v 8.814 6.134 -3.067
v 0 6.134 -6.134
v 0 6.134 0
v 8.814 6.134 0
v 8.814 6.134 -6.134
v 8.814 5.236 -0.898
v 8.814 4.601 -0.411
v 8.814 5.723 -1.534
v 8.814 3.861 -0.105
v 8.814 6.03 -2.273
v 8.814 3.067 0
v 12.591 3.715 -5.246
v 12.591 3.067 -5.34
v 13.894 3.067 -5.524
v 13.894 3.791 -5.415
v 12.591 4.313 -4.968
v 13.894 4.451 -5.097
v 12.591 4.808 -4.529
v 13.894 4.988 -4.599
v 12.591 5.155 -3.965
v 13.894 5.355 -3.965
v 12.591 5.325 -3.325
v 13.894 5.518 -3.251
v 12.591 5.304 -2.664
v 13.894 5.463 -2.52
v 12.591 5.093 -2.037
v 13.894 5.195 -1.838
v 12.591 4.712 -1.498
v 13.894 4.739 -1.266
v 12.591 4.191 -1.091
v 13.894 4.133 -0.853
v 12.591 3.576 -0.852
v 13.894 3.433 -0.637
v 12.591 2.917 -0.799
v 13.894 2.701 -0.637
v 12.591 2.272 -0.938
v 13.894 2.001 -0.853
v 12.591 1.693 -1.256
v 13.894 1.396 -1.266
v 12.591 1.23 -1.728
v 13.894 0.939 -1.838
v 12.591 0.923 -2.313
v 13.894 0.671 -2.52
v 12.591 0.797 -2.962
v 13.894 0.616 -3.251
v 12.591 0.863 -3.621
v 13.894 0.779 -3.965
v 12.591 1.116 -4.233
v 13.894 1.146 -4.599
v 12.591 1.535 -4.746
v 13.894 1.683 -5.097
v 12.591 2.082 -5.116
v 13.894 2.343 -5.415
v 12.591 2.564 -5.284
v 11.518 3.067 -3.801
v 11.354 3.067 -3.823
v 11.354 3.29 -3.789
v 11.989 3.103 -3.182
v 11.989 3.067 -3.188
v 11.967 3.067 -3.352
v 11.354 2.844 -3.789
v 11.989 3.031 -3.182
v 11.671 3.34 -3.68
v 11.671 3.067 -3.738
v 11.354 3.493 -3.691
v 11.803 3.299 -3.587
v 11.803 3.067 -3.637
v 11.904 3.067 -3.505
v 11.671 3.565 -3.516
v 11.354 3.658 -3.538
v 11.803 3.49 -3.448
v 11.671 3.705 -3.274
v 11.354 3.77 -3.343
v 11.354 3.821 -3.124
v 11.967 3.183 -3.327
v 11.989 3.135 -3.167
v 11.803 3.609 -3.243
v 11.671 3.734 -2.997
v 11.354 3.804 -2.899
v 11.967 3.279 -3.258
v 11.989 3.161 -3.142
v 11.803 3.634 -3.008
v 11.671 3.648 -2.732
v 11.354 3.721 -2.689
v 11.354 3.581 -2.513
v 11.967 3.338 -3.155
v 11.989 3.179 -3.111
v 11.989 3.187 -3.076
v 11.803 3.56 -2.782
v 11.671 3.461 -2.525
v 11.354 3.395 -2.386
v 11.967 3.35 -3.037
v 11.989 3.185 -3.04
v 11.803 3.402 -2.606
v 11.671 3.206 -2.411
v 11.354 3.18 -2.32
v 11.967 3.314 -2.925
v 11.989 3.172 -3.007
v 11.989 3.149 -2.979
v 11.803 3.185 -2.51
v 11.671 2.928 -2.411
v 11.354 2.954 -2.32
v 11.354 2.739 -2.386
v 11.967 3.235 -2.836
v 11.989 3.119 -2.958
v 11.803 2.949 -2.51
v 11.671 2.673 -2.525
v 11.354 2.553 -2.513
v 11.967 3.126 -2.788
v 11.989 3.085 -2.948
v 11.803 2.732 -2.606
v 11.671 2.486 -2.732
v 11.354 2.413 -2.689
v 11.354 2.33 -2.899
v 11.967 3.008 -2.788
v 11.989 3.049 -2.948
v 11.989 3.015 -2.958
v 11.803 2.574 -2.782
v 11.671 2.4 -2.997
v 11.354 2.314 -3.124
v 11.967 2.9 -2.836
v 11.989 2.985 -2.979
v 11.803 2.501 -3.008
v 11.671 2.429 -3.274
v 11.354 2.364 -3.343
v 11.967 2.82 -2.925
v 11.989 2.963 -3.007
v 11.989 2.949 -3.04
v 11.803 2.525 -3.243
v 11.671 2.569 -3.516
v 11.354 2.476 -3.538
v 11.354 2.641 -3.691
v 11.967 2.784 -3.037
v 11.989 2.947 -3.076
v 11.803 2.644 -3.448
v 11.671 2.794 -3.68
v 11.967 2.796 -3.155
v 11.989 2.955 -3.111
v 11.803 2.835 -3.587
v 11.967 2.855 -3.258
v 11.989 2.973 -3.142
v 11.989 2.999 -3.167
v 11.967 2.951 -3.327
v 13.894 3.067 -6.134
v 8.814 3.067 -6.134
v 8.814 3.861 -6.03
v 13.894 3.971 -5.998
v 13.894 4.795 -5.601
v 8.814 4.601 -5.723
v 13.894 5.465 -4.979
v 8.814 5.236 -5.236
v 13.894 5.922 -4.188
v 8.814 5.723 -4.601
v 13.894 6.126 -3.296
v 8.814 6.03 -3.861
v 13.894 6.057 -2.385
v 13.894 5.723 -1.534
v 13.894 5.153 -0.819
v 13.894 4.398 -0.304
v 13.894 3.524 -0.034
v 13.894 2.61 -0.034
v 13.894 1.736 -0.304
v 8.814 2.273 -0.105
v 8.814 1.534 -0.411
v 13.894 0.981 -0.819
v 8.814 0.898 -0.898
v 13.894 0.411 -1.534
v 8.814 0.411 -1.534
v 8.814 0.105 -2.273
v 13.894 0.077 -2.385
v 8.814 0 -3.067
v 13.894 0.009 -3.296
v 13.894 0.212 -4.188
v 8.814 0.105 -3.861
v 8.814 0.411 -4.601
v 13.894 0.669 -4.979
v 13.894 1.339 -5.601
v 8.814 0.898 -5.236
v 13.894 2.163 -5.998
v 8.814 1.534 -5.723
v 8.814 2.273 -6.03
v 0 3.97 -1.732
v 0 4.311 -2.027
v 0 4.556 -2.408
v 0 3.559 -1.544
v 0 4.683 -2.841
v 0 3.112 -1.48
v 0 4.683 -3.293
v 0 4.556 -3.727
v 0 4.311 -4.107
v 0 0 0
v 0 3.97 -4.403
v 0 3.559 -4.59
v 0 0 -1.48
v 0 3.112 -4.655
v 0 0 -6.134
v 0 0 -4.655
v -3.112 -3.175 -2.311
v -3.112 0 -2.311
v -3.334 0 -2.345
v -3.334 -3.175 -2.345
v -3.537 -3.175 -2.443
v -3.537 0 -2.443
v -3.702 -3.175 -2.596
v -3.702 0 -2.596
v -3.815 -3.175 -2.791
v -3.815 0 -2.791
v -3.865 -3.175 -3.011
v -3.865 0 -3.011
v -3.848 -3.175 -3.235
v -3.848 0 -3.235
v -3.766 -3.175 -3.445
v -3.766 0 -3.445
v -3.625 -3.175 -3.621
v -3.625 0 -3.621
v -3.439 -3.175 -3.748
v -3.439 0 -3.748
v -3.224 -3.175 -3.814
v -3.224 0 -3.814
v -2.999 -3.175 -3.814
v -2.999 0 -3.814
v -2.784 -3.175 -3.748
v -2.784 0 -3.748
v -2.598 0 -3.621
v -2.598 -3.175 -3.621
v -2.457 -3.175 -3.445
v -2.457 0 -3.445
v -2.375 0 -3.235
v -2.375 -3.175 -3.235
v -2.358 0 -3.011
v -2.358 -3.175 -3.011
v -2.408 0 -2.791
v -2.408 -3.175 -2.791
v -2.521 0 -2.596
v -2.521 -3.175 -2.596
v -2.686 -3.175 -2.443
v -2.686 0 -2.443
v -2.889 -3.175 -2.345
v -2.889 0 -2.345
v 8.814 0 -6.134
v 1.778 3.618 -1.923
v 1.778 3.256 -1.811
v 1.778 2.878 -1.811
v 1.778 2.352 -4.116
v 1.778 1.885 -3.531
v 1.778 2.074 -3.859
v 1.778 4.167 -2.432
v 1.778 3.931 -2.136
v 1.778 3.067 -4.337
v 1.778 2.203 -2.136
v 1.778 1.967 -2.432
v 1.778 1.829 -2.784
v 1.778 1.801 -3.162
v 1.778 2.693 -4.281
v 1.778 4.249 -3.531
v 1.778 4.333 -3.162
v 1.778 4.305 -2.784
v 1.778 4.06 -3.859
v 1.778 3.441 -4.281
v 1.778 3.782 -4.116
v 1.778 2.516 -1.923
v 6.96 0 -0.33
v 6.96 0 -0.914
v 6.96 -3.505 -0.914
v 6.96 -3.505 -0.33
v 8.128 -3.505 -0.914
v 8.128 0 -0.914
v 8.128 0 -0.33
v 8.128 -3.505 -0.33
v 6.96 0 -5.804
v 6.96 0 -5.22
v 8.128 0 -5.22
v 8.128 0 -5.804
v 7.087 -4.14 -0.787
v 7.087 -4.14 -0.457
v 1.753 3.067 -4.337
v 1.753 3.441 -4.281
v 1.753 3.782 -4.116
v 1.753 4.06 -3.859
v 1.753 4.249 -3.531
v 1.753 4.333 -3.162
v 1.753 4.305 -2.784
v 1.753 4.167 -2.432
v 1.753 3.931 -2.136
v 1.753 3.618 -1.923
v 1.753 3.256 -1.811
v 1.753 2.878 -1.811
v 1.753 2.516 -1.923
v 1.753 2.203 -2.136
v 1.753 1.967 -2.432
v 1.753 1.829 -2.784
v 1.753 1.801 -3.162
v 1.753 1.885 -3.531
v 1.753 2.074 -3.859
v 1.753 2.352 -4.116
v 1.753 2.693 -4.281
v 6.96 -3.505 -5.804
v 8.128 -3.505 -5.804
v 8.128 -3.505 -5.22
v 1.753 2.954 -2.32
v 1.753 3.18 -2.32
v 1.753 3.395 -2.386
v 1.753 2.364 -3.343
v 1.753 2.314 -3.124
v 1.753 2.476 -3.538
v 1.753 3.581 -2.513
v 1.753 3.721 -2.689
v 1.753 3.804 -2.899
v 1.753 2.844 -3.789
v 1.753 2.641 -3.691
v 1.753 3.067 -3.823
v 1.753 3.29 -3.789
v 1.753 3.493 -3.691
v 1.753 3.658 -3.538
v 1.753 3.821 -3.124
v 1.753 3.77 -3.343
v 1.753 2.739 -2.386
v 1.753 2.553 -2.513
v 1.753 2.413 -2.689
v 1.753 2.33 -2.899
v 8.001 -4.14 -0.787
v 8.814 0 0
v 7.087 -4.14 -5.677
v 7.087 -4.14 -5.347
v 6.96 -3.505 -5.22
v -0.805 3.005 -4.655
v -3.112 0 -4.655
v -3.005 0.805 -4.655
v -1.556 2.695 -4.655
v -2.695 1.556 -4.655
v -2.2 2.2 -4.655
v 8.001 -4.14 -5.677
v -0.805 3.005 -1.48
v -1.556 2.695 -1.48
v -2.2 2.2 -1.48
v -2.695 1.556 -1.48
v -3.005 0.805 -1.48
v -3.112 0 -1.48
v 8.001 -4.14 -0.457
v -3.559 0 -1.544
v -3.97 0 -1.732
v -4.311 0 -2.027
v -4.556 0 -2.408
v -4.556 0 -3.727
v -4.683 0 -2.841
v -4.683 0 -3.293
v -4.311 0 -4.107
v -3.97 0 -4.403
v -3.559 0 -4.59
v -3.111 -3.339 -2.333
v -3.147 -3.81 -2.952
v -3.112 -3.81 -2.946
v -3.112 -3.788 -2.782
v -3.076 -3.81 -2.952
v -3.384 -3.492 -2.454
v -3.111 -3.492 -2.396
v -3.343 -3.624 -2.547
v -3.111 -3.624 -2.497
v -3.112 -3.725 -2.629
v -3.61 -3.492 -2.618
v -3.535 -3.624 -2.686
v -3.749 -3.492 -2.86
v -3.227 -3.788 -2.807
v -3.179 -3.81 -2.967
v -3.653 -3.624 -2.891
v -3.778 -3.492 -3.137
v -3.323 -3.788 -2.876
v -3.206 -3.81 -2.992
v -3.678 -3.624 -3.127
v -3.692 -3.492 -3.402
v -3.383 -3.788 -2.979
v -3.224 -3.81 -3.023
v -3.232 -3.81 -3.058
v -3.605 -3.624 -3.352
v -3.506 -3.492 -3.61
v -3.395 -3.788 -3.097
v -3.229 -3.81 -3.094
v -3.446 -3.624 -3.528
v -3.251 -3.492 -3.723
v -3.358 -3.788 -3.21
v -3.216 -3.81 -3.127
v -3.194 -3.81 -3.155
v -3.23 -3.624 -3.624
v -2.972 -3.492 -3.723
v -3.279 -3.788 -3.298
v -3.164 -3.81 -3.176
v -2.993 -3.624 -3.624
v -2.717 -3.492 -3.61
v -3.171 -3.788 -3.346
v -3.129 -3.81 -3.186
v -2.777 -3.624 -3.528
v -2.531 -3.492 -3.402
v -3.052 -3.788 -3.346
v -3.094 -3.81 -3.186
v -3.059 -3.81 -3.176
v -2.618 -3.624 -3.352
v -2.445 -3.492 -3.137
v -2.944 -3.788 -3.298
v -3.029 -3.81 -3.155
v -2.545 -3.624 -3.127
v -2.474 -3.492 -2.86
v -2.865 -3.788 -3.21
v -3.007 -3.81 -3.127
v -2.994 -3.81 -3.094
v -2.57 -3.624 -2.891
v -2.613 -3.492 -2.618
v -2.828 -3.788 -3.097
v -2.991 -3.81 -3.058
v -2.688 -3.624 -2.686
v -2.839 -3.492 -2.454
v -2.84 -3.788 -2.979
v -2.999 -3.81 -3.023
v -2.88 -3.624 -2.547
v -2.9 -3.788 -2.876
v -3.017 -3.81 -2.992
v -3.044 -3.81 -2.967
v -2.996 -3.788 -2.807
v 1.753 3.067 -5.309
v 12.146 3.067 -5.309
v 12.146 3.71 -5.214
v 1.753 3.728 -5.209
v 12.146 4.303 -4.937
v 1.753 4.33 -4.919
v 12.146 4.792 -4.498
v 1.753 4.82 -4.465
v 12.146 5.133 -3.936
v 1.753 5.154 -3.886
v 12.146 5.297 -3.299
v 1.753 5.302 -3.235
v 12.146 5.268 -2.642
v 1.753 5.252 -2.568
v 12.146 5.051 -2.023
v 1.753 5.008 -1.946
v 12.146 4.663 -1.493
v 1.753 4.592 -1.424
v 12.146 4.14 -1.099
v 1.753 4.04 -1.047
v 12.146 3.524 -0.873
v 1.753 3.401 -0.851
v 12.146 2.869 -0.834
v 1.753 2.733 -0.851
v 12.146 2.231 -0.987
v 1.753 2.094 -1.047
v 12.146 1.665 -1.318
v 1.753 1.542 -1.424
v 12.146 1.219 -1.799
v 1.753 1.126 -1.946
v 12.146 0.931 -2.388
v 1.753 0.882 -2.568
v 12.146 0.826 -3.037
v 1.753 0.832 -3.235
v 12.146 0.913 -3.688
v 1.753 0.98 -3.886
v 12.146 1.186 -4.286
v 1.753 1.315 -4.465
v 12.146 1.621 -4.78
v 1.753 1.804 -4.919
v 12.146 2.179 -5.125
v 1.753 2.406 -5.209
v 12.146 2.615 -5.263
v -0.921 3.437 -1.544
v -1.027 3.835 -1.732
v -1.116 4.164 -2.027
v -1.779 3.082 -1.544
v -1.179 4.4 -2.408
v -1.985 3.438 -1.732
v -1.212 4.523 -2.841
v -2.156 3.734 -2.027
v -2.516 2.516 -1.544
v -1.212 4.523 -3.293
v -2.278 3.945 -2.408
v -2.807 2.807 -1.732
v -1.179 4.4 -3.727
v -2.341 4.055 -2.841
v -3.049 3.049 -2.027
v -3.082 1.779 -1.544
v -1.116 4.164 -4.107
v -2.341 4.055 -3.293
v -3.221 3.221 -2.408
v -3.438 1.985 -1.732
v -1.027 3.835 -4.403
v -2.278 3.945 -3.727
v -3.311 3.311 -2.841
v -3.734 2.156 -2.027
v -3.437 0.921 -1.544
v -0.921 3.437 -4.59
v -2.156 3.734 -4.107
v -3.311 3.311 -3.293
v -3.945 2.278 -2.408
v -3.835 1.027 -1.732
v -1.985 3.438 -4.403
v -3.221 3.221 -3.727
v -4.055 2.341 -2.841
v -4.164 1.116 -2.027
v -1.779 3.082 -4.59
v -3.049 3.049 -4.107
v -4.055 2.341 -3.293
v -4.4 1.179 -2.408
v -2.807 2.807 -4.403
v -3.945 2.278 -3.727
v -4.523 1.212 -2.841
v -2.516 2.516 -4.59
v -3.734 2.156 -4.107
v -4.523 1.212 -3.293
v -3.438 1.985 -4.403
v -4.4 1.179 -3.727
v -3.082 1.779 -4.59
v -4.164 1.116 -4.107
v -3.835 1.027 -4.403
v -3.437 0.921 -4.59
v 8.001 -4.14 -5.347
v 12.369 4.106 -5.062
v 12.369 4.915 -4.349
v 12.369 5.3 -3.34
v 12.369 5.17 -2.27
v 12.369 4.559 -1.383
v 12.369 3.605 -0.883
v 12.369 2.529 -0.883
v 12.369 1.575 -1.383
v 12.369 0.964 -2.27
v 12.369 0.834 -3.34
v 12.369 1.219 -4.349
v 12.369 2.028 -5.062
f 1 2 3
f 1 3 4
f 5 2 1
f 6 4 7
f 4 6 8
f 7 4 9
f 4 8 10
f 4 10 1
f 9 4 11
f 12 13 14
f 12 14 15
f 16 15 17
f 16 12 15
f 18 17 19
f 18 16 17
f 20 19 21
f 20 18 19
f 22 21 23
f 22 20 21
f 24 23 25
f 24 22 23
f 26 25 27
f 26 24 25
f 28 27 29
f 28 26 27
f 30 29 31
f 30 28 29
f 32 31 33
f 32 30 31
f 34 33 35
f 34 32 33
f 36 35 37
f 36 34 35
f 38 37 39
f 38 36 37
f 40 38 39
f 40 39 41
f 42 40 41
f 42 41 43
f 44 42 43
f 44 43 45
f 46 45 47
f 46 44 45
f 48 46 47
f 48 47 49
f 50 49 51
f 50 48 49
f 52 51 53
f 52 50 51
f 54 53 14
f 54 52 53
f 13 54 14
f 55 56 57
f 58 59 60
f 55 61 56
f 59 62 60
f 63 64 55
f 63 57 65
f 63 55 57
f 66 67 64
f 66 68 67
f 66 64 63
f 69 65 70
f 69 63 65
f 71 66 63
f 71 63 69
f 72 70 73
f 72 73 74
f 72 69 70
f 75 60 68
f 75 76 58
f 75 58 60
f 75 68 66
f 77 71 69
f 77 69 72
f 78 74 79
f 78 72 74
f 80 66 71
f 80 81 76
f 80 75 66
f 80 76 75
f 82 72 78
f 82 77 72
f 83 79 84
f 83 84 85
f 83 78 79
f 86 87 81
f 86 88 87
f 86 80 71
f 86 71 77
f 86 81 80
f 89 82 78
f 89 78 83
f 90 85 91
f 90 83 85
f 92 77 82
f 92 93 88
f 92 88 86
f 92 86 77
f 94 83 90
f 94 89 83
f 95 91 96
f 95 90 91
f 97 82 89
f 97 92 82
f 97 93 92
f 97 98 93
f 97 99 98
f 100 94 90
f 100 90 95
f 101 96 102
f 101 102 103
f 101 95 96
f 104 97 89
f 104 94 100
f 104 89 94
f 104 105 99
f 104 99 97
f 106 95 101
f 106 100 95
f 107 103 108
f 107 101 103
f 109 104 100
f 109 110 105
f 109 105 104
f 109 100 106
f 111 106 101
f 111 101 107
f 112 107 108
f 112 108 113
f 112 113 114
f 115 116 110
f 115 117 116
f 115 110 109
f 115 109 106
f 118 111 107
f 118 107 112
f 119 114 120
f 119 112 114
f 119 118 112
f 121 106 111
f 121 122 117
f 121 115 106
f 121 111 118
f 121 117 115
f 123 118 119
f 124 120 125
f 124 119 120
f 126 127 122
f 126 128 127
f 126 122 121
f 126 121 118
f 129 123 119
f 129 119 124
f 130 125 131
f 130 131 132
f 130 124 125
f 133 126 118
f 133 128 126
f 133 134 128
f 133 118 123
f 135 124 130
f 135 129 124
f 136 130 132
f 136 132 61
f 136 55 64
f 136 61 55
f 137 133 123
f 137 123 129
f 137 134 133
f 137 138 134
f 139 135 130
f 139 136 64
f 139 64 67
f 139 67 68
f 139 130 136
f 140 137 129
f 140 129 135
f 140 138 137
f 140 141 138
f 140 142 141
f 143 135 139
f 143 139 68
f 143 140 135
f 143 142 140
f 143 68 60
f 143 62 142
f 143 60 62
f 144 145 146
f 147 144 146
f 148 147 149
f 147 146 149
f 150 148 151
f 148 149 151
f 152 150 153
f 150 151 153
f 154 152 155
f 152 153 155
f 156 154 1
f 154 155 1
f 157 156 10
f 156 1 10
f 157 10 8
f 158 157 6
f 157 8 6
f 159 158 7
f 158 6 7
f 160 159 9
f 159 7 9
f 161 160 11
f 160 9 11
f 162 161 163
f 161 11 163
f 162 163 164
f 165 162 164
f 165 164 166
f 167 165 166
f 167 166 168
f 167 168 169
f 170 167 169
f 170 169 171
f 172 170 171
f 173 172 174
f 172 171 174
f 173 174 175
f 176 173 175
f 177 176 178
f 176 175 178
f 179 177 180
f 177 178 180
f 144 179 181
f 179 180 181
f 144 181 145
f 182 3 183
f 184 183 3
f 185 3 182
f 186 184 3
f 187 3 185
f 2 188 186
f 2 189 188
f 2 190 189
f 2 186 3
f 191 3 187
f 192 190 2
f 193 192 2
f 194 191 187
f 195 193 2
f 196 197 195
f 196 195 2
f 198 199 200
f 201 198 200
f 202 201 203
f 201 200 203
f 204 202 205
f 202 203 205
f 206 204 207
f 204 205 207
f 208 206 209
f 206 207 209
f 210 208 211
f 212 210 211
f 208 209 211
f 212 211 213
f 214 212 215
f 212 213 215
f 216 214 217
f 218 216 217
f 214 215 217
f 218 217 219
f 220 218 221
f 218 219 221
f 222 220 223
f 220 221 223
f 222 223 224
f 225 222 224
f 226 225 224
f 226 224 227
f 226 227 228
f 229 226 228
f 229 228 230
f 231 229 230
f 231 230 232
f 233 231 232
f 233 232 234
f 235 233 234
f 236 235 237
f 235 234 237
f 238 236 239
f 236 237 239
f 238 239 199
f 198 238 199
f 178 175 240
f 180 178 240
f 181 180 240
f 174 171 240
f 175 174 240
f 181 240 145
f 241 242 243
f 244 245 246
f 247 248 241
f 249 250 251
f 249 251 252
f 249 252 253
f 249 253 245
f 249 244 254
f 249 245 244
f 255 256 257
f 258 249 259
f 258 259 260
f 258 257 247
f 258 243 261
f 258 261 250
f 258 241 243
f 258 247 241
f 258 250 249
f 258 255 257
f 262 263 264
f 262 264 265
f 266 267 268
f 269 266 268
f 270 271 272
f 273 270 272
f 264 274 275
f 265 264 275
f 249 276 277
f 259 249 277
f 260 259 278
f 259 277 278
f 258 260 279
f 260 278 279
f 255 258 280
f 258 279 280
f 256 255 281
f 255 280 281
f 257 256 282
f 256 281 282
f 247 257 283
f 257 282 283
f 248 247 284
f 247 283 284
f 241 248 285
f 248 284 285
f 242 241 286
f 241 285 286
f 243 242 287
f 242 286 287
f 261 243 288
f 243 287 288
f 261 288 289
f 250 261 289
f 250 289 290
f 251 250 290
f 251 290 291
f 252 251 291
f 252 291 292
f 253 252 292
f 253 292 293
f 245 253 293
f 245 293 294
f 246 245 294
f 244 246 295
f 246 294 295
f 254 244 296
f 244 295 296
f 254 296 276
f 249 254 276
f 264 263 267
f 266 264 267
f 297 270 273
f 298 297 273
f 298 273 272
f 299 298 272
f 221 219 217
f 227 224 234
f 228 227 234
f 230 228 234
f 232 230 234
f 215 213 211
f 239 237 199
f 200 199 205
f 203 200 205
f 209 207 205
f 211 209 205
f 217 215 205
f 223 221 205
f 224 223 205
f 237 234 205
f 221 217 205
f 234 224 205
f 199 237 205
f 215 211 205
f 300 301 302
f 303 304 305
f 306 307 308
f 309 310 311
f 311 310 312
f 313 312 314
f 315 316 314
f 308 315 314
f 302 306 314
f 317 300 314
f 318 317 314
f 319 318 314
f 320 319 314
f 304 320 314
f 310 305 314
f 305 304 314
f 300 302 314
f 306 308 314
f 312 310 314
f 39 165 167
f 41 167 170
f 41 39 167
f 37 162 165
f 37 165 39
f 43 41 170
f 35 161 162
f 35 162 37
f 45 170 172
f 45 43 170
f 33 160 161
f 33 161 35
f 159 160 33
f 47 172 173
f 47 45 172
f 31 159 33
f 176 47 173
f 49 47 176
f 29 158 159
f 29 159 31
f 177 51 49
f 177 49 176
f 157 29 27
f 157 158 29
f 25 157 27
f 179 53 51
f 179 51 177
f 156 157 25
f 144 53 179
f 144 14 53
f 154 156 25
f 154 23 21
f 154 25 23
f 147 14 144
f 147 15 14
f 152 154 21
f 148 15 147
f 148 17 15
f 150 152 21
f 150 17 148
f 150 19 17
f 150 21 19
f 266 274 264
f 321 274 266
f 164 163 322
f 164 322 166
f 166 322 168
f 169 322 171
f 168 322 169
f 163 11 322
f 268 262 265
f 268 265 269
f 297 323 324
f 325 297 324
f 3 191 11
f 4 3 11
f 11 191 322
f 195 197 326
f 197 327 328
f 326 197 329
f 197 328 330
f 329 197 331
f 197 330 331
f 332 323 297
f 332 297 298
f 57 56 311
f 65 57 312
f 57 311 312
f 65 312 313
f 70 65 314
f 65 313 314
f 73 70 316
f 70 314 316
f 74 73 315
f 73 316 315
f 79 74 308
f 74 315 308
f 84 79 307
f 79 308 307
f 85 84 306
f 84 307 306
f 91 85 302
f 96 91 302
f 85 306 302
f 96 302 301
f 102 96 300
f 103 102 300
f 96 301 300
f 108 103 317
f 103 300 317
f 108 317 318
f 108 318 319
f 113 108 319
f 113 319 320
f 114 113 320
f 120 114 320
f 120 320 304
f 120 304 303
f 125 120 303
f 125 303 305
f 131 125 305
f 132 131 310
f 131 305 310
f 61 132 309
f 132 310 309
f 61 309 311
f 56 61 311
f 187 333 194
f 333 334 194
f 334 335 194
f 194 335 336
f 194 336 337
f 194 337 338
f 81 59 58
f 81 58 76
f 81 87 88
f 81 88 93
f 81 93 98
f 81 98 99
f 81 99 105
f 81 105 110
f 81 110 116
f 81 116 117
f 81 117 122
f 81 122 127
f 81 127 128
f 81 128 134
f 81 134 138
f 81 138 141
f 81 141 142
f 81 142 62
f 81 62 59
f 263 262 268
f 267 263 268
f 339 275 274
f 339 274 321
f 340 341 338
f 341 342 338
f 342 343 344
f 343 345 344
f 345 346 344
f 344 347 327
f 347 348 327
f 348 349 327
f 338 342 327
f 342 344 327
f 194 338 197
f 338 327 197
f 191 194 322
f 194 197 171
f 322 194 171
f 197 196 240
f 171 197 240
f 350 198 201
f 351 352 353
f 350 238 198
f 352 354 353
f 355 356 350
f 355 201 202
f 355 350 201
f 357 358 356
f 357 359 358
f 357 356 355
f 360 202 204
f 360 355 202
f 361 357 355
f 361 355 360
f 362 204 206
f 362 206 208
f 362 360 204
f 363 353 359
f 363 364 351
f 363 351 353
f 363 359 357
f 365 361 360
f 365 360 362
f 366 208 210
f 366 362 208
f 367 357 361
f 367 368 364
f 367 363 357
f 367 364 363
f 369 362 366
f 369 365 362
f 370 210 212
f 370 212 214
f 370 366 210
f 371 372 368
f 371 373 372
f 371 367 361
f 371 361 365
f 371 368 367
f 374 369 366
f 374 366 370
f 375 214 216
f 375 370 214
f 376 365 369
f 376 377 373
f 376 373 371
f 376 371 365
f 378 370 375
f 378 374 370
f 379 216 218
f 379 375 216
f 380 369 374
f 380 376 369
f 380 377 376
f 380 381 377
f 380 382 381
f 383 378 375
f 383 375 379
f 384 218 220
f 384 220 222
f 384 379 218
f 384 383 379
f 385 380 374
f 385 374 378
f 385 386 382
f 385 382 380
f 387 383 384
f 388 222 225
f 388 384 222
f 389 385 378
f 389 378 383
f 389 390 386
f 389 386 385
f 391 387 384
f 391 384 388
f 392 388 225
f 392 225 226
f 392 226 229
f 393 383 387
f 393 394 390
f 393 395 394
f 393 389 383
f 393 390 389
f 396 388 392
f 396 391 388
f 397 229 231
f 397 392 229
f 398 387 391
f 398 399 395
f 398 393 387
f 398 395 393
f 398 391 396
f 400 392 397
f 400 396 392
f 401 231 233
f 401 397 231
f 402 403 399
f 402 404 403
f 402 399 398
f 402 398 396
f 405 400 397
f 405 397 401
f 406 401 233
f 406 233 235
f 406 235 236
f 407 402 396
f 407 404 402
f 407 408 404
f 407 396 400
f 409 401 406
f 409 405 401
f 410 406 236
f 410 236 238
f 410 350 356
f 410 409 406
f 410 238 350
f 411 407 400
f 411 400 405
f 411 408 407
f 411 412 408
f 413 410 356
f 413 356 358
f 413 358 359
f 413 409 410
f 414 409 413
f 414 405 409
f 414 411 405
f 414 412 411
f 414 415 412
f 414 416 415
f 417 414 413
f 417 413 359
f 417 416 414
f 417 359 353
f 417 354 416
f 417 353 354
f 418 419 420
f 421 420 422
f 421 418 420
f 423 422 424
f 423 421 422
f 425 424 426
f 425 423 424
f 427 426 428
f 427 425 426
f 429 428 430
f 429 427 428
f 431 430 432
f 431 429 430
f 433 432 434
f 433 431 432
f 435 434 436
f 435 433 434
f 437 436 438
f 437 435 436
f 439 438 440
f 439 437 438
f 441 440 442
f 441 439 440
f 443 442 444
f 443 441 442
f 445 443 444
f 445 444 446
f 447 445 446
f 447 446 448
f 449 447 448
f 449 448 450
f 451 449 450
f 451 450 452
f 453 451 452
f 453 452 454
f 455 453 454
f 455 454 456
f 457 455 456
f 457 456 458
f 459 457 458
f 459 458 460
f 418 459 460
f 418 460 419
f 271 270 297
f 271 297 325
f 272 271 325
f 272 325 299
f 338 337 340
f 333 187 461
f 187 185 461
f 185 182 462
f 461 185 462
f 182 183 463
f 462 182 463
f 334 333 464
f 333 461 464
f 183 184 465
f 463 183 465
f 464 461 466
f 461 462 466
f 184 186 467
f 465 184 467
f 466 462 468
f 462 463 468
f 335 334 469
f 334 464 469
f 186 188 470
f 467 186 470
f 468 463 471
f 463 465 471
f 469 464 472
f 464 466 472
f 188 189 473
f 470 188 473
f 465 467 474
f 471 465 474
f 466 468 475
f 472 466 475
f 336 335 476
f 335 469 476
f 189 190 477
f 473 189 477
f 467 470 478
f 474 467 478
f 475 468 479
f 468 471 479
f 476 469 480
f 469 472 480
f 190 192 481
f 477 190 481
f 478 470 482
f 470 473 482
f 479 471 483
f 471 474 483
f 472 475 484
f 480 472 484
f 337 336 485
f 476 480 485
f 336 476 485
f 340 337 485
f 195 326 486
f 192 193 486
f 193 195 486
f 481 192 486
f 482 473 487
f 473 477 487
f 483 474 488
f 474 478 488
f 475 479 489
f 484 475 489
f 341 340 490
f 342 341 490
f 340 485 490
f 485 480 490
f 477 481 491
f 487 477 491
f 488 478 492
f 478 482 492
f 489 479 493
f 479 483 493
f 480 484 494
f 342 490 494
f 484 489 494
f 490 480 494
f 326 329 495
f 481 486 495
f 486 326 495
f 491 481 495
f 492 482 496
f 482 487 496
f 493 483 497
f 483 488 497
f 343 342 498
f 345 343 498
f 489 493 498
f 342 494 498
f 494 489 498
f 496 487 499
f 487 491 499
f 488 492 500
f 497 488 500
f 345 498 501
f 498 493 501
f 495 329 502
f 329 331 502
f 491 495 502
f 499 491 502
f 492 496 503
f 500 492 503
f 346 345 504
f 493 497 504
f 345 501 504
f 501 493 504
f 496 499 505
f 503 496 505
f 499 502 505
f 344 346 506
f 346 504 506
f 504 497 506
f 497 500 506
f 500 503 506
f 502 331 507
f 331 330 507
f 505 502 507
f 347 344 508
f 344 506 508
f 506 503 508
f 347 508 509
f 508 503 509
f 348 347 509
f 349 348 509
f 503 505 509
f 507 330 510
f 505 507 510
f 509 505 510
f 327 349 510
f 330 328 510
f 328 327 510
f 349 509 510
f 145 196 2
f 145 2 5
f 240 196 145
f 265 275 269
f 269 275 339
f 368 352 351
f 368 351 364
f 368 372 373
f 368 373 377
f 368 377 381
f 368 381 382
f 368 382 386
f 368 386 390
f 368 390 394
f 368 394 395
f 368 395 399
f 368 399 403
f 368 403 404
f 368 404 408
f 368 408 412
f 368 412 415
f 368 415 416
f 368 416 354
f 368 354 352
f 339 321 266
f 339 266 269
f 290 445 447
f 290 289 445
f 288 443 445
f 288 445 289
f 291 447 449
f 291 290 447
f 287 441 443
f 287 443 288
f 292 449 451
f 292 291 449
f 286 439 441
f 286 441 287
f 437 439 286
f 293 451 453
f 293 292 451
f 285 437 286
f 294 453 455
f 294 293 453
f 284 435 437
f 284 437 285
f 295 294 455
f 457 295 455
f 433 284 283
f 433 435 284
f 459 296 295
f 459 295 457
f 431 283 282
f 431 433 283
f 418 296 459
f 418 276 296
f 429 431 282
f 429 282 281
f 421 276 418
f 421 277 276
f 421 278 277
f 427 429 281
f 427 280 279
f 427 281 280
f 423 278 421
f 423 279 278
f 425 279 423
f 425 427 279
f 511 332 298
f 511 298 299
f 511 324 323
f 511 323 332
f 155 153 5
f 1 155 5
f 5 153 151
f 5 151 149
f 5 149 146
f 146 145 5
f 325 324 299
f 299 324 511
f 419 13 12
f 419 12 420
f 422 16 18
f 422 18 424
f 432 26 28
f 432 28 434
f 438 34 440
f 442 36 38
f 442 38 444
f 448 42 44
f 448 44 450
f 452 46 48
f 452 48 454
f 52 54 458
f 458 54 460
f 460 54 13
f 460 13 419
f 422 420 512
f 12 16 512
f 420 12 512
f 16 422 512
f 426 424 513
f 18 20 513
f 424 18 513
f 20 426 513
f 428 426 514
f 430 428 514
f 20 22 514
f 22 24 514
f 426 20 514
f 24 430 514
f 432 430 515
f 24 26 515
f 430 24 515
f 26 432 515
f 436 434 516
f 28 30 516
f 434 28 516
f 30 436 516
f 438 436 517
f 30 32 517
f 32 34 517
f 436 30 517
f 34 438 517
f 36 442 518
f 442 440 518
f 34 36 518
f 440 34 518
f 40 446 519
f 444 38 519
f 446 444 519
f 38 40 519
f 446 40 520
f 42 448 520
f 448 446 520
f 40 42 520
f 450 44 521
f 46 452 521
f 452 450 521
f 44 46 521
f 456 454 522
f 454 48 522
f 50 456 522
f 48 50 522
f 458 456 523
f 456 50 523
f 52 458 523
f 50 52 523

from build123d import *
from OCP.BRepFilletAPI import BRepFilletAPI_MakeChamfer

# Parameters (mm, degrees)
SKETCH1_W             = 8.8138
SKETCH1_H             = 6.1341
BOSS_EXTRUDE1_DEPTH   = 6.1341
SKETCH2_R             = 3.06705
SKETCH2_R_2           = 2.24155
BOSS_EXTRUDE2_DEPTH   = 5.08
REVOLVE1_ANGLE        = 90
CUT_EXTRUDE1_START    = -7.0612
SKETCH6_R             = 2.24155
CUT_EXTRUDE1_DEPTH    = 7.0612
SKETCH11_R            = 1.27
BOSS_EXTRUDE6_DEPTH   = 0.0254
CHAMFER3_SIZE         = 0.2159
CHAMFER3_SIZE2        = 1.524
FILLET4_R             = 3.175
SKETCH7_R             = 0.75565
BOSS_EXTRUDE3_DEPTH   = 10.2362
FILLET3_R             = 0.635
SKETCH8_R             = 0.75565
BOSS_EXTRUDE4_DEPTH   = 3.81
FILLET2_R             = 0.635
SKETCH10_W            = 1.1684
SKETCH10_H            = 0.5842
BOSS_EXTRUDE5_DEPTH   = 4.1402
BOSS_EXTRUDE5_2_DEPTH = 4.1402
CHAMFER1_SIZE         = 0.635
CHAMFER1_SIZE2        = 0.127
CHAMFER2_SIZE         = 0.635
CHAMFER2_SIZE2        = 0.127


with BuildPart() as part:
    # Sketch1 → Boss-Extrude1 (new body)
    with BuildSketch(Plane(origin=(0, 0, 0), x_dir=(1, 0, 0), z_dir=(0, 1, 0))):
        with Locations((4.4069, 3.06705)):
            Rectangle(SKETCH1_W, SKETCH1_H)
    extrude(amount=BOSS_EXTRUDE1_DEPTH)

    # Sketch2 → Boss-Extrude2 (add)
    with BuildSketch(Plane(origin=(8.8138, 0, 0), x_dir=(0, 0, -1), z_dir=(1, 0, 0))):
        with Locations((3.06705, 3.06705)):
            Circle(SKETCH2_R)
        with Locations((3.06705, 3.06705)):
            Circle(SKETCH2_R_2, mode=Mode.SUBTRACT)
    extrude(amount=BOSS_EXTRUDE2_DEPTH)

    # Sketch3 → Revolve1 (revolve)
    with BuildSketch(Plane.ZY):
        with BuildLine():
            Line((-4.65455, 3.1115), (-4.65455, 0))
            Line((-4.65455, 0), (-1.47955, 0))
            Line((-1.47955, 0), (-1.47955, 3.1115))
            ThreePointArc((-1.47955, 3.1115), (-3.06705, 4.699), (-4.65455, 3.1115))
        make_face()
    revolve(axis=Axis((0, 0, 0), (0, 0, 1)), revolution_arc=REVOLVE1_ANGLE)

    # Sketch6 → Cut-Extrude1 (cut)
    with BuildSketch(Plane(origin=(8.8138, 0, 0), x_dir=(0, 0, -1), z_dir=(1, 0, 0)).offset(CUT_EXTRUDE1_START)):
        with Locations((3.06705, 3.06705)):
            Circle(SKETCH6_R)
    extrude(amount=CUT_EXTRUDE1_DEPTH, mode=Mode.SUBTRACT)

    # Sketch11 → Boss-Extrude6 (add)
    with BuildSketch(Plane(origin=(1.7526, 0, 0), x_dir=(0, 0, -1), z_dir=(1, 0, 0))):
        with Locations((3.06705, 3.06705)):
            Circle(SKETCH11_R)
    extrude(amount=BOSS_EXTRUDE6_DEPTH)

    # Chamfer3
    chamfer3_edges = [part.edges().sort_by_distance(p)[0] for p in [
        (13.8938, 3.06705, -0.8255),
    ]]
    chamfer3_side = [part.faces().sort_by_distance(p)[0] for p in [
        (13.8938, 3.06705, -0.086749274),
    ]]
    chamfer(chamfer3_edges, length=CHAMFER3_SIZE, length2=CHAMFER3_SIZE2, reference=chamfer3_side[0])

    # Fillet4
    fillet4_edges = [part.edges().sort_by_distance(p)[0] for p in [
        (12.3698, 3.06705, -0.8255),
    ]]
    fillet(fillet4_edges, radius=FILLET4_R)


with BuildPart() as body_2:
    # Sketch7 → Boss-Extrude3 (new body)
    with BuildSketch(Plane(origin=(1.7526, 0, 0), x_dir=(0, 0, -1), z_dir=(1, 0, 0))):
        with Locations((3.06705, 3.06705)):
            Circle(SKETCH7_R)
    extrude(amount=BOSS_EXTRUDE3_DEPTH)

    # Fillet3
    fillet3_edges = [body_2.edges().sort_by_distance(p)[0] for p in [
        (11.9888, 3.06705, -2.3114),
    ]]
    fillet(fillet3_edges, radius=FILLET3_R)


with BuildPart() as body_3:
    # Sketch8 → Boss-Extrude4 (new body)
    with BuildSketch(Plane.XZ):
        with Locations(Location((-3.1115, -3.06705, 0), (0, 0, 90))):
            Circle(SKETCH8_R)
    extrude(amount=BOSS_EXTRUDE4_DEPTH)

    # Fillet2
    fillet2_edges = [body_3.edges().sort_by_distance(p)[0] for p in [
        (-3.1115, -3.81, -3.8227),
    ]]
    fillet(fillet2_edges, radius=FILLET2_R)


with BuildPart() as body_4:
    # Sketch10 → Boss-Extrude5 (new body)
    with BuildSketch(Plane.XZ):
        with Locations((7.5438, -0.6223)):
            Rectangle(SKETCH10_W, SKETCH10_H)
    extrude(amount=BOSS_EXTRUDE5_DEPTH)

    # Chamfer1: one chamfer whose edges measure the first distance from different faces: ONE call of the kernel's chamfer builder (chamfer() names one face for all edges)
    chamfer1_edges_1 = [body_4.edges().sort_by_distance(p)[0] for p in [
        (6.9596, -4.1402, -0.6223),
    ]]
    chamfer1_side_1 = [body_4.faces().sort_by_distance(p)[0] for p in [
        (6.9596, -2.0701, -0.6223),
    ]]
    chamfer1_edges_2 = [body_4.edges().sort_by_distance(p)[0] for p in [
        (7.5438, -4.1402, -0.9144),
    ]]
    chamfer1_side_2 = [body_4.faces().sort_by_distance(p)[0] for p in [
        (7.5438, -2.0701, -0.9144),
    ]]
    chamfer1_edges_3 = [body_4.edges().sort_by_distance(p)[0] for p in [
        (8.128, -4.1402, -0.6223),
    ]]
    chamfer1_side_3 = [body_4.faces().sort_by_distance(p)[0] for p in [
        (8.128, -2.0701, -0.6223),
    ]]
    chamfer1_edges_4 = [body_4.edges().sort_by_distance(p)[0] for p in [
        (7.5438, -4.1402, -0.3302),
    ]]
    chamfer1_side_4 = [body_4.faces().sort_by_distance(p)[0] for p in [
        (7.5438, -2.0701, -0.3302),
    ]]
    chamfer1 = BRepFilletAPI_MakeChamfer(body_4.part.solid().wrapped)
    for e in chamfer1_edges_1:
        chamfer1.Add(CHAMFER1_SIZE, CHAMFER1_SIZE2, e.wrapped, chamfer1_side_1[0].wrapped)  # the first distance lies on this face
    for e in chamfer1_edges_2:
        chamfer1.Add(CHAMFER1_SIZE, CHAMFER1_SIZE2, e.wrapped, chamfer1_side_2[0].wrapped)  # the first distance lies on this face
    for e in chamfer1_edges_3:
        chamfer1.Add(CHAMFER1_SIZE, CHAMFER1_SIZE2, e.wrapped, chamfer1_side_3[0].wrapped)  # the first distance lies on this face
    for e in chamfer1_edges_4:
        chamfer1.Add(CHAMFER1_SIZE, CHAMFER1_SIZE2, e.wrapped, chamfer1_side_4[0].wrapped)  # the first distance lies on this face
    add(Compound.cast(chamfer1.Shape()), mode=Mode.REPLACE)


with BuildPart() as body_5:
    # Sketch10 → Boss-Extrude5 2 (new body)
    with BuildSketch(Plane.XZ):
        with Locations((7.5438, -5.5118)):
            Rectangle(SKETCH10_W, SKETCH10_H)
    extrude(amount=BOSS_EXTRUDE5_2_DEPTH)

    # Chamfer2: one chamfer whose edges measure the first distance from different faces: ONE call of the kernel's chamfer builder (chamfer() names one face for all edges)
    chamfer2_edges_1 = [body_5.edges().sort_by_distance(p)[0] for p in [
        (6.9596, -4.1402, -5.5118),
    ]]
    chamfer2_side_1 = [body_5.faces().sort_by_distance(p)[0] for p in [
        (6.9596, -2.0701, -5.5118),
    ]]
    chamfer2_edges_2 = [body_5.edges().sort_by_distance(p)[0] for p in [
        (7.5438, -4.1402, -5.8039),
    ]]
    chamfer2_side_2 = [body_5.faces().sort_by_distance(p)[0] for p in [
        (7.5438, -2.0701, -5.8039),
    ]]
    chamfer2_edges_3 = [body_5.edges().sort_by_distance(p)[0] for p in [
        (8.128, -4.1402, -5.5118),
    ]]
    chamfer2_side_3 = [body_5.faces().sort_by_distance(p)[0] for p in [
        (8.128, -2.0701, -5.5118),
    ]]
    chamfer2_edges_4 = [body_5.edges().sort_by_distance(p)[0] for p in [
        (7.5438, -4.1402, -5.2197),
    ]]
    chamfer2_side_4 = [body_5.faces().sort_by_distance(p)[0] for p in [
        (7.5438, -2.0701, -5.2197),
    ]]
    chamfer2 = BRepFilletAPI_MakeChamfer(body_5.part.solid().wrapped)
    for e in chamfer2_edges_1:
        chamfer2.Add(CHAMFER2_SIZE, CHAMFER2_SIZE2, e.wrapped, chamfer2_side_1[0].wrapped)  # the first distance lies on this face
    for e in chamfer2_edges_2:
        chamfer2.Add(CHAMFER2_SIZE, CHAMFER2_SIZE2, e.wrapped, chamfer2_side_2[0].wrapped)  # the first distance lies on this face
    for e in chamfer2_edges_3:
        chamfer2.Add(CHAMFER2_SIZE, CHAMFER2_SIZE2, e.wrapped, chamfer2_side_3[0].wrapped)  # the first distance lies on this face
    for e in chamfer2_edges_4:
        chamfer2.Add(CHAMFER2_SIZE, CHAMFER2_SIZE2, e.wrapped, chamfer2_side_4[0].wrapped)  # the first distance lies on this face
    add(Compound.cast(chamfer2.Shape()), mode=Mode.REPLACE)


solid = Compound([part.part, body_2.part, body_3.part, body_4.part, body_5.part])
